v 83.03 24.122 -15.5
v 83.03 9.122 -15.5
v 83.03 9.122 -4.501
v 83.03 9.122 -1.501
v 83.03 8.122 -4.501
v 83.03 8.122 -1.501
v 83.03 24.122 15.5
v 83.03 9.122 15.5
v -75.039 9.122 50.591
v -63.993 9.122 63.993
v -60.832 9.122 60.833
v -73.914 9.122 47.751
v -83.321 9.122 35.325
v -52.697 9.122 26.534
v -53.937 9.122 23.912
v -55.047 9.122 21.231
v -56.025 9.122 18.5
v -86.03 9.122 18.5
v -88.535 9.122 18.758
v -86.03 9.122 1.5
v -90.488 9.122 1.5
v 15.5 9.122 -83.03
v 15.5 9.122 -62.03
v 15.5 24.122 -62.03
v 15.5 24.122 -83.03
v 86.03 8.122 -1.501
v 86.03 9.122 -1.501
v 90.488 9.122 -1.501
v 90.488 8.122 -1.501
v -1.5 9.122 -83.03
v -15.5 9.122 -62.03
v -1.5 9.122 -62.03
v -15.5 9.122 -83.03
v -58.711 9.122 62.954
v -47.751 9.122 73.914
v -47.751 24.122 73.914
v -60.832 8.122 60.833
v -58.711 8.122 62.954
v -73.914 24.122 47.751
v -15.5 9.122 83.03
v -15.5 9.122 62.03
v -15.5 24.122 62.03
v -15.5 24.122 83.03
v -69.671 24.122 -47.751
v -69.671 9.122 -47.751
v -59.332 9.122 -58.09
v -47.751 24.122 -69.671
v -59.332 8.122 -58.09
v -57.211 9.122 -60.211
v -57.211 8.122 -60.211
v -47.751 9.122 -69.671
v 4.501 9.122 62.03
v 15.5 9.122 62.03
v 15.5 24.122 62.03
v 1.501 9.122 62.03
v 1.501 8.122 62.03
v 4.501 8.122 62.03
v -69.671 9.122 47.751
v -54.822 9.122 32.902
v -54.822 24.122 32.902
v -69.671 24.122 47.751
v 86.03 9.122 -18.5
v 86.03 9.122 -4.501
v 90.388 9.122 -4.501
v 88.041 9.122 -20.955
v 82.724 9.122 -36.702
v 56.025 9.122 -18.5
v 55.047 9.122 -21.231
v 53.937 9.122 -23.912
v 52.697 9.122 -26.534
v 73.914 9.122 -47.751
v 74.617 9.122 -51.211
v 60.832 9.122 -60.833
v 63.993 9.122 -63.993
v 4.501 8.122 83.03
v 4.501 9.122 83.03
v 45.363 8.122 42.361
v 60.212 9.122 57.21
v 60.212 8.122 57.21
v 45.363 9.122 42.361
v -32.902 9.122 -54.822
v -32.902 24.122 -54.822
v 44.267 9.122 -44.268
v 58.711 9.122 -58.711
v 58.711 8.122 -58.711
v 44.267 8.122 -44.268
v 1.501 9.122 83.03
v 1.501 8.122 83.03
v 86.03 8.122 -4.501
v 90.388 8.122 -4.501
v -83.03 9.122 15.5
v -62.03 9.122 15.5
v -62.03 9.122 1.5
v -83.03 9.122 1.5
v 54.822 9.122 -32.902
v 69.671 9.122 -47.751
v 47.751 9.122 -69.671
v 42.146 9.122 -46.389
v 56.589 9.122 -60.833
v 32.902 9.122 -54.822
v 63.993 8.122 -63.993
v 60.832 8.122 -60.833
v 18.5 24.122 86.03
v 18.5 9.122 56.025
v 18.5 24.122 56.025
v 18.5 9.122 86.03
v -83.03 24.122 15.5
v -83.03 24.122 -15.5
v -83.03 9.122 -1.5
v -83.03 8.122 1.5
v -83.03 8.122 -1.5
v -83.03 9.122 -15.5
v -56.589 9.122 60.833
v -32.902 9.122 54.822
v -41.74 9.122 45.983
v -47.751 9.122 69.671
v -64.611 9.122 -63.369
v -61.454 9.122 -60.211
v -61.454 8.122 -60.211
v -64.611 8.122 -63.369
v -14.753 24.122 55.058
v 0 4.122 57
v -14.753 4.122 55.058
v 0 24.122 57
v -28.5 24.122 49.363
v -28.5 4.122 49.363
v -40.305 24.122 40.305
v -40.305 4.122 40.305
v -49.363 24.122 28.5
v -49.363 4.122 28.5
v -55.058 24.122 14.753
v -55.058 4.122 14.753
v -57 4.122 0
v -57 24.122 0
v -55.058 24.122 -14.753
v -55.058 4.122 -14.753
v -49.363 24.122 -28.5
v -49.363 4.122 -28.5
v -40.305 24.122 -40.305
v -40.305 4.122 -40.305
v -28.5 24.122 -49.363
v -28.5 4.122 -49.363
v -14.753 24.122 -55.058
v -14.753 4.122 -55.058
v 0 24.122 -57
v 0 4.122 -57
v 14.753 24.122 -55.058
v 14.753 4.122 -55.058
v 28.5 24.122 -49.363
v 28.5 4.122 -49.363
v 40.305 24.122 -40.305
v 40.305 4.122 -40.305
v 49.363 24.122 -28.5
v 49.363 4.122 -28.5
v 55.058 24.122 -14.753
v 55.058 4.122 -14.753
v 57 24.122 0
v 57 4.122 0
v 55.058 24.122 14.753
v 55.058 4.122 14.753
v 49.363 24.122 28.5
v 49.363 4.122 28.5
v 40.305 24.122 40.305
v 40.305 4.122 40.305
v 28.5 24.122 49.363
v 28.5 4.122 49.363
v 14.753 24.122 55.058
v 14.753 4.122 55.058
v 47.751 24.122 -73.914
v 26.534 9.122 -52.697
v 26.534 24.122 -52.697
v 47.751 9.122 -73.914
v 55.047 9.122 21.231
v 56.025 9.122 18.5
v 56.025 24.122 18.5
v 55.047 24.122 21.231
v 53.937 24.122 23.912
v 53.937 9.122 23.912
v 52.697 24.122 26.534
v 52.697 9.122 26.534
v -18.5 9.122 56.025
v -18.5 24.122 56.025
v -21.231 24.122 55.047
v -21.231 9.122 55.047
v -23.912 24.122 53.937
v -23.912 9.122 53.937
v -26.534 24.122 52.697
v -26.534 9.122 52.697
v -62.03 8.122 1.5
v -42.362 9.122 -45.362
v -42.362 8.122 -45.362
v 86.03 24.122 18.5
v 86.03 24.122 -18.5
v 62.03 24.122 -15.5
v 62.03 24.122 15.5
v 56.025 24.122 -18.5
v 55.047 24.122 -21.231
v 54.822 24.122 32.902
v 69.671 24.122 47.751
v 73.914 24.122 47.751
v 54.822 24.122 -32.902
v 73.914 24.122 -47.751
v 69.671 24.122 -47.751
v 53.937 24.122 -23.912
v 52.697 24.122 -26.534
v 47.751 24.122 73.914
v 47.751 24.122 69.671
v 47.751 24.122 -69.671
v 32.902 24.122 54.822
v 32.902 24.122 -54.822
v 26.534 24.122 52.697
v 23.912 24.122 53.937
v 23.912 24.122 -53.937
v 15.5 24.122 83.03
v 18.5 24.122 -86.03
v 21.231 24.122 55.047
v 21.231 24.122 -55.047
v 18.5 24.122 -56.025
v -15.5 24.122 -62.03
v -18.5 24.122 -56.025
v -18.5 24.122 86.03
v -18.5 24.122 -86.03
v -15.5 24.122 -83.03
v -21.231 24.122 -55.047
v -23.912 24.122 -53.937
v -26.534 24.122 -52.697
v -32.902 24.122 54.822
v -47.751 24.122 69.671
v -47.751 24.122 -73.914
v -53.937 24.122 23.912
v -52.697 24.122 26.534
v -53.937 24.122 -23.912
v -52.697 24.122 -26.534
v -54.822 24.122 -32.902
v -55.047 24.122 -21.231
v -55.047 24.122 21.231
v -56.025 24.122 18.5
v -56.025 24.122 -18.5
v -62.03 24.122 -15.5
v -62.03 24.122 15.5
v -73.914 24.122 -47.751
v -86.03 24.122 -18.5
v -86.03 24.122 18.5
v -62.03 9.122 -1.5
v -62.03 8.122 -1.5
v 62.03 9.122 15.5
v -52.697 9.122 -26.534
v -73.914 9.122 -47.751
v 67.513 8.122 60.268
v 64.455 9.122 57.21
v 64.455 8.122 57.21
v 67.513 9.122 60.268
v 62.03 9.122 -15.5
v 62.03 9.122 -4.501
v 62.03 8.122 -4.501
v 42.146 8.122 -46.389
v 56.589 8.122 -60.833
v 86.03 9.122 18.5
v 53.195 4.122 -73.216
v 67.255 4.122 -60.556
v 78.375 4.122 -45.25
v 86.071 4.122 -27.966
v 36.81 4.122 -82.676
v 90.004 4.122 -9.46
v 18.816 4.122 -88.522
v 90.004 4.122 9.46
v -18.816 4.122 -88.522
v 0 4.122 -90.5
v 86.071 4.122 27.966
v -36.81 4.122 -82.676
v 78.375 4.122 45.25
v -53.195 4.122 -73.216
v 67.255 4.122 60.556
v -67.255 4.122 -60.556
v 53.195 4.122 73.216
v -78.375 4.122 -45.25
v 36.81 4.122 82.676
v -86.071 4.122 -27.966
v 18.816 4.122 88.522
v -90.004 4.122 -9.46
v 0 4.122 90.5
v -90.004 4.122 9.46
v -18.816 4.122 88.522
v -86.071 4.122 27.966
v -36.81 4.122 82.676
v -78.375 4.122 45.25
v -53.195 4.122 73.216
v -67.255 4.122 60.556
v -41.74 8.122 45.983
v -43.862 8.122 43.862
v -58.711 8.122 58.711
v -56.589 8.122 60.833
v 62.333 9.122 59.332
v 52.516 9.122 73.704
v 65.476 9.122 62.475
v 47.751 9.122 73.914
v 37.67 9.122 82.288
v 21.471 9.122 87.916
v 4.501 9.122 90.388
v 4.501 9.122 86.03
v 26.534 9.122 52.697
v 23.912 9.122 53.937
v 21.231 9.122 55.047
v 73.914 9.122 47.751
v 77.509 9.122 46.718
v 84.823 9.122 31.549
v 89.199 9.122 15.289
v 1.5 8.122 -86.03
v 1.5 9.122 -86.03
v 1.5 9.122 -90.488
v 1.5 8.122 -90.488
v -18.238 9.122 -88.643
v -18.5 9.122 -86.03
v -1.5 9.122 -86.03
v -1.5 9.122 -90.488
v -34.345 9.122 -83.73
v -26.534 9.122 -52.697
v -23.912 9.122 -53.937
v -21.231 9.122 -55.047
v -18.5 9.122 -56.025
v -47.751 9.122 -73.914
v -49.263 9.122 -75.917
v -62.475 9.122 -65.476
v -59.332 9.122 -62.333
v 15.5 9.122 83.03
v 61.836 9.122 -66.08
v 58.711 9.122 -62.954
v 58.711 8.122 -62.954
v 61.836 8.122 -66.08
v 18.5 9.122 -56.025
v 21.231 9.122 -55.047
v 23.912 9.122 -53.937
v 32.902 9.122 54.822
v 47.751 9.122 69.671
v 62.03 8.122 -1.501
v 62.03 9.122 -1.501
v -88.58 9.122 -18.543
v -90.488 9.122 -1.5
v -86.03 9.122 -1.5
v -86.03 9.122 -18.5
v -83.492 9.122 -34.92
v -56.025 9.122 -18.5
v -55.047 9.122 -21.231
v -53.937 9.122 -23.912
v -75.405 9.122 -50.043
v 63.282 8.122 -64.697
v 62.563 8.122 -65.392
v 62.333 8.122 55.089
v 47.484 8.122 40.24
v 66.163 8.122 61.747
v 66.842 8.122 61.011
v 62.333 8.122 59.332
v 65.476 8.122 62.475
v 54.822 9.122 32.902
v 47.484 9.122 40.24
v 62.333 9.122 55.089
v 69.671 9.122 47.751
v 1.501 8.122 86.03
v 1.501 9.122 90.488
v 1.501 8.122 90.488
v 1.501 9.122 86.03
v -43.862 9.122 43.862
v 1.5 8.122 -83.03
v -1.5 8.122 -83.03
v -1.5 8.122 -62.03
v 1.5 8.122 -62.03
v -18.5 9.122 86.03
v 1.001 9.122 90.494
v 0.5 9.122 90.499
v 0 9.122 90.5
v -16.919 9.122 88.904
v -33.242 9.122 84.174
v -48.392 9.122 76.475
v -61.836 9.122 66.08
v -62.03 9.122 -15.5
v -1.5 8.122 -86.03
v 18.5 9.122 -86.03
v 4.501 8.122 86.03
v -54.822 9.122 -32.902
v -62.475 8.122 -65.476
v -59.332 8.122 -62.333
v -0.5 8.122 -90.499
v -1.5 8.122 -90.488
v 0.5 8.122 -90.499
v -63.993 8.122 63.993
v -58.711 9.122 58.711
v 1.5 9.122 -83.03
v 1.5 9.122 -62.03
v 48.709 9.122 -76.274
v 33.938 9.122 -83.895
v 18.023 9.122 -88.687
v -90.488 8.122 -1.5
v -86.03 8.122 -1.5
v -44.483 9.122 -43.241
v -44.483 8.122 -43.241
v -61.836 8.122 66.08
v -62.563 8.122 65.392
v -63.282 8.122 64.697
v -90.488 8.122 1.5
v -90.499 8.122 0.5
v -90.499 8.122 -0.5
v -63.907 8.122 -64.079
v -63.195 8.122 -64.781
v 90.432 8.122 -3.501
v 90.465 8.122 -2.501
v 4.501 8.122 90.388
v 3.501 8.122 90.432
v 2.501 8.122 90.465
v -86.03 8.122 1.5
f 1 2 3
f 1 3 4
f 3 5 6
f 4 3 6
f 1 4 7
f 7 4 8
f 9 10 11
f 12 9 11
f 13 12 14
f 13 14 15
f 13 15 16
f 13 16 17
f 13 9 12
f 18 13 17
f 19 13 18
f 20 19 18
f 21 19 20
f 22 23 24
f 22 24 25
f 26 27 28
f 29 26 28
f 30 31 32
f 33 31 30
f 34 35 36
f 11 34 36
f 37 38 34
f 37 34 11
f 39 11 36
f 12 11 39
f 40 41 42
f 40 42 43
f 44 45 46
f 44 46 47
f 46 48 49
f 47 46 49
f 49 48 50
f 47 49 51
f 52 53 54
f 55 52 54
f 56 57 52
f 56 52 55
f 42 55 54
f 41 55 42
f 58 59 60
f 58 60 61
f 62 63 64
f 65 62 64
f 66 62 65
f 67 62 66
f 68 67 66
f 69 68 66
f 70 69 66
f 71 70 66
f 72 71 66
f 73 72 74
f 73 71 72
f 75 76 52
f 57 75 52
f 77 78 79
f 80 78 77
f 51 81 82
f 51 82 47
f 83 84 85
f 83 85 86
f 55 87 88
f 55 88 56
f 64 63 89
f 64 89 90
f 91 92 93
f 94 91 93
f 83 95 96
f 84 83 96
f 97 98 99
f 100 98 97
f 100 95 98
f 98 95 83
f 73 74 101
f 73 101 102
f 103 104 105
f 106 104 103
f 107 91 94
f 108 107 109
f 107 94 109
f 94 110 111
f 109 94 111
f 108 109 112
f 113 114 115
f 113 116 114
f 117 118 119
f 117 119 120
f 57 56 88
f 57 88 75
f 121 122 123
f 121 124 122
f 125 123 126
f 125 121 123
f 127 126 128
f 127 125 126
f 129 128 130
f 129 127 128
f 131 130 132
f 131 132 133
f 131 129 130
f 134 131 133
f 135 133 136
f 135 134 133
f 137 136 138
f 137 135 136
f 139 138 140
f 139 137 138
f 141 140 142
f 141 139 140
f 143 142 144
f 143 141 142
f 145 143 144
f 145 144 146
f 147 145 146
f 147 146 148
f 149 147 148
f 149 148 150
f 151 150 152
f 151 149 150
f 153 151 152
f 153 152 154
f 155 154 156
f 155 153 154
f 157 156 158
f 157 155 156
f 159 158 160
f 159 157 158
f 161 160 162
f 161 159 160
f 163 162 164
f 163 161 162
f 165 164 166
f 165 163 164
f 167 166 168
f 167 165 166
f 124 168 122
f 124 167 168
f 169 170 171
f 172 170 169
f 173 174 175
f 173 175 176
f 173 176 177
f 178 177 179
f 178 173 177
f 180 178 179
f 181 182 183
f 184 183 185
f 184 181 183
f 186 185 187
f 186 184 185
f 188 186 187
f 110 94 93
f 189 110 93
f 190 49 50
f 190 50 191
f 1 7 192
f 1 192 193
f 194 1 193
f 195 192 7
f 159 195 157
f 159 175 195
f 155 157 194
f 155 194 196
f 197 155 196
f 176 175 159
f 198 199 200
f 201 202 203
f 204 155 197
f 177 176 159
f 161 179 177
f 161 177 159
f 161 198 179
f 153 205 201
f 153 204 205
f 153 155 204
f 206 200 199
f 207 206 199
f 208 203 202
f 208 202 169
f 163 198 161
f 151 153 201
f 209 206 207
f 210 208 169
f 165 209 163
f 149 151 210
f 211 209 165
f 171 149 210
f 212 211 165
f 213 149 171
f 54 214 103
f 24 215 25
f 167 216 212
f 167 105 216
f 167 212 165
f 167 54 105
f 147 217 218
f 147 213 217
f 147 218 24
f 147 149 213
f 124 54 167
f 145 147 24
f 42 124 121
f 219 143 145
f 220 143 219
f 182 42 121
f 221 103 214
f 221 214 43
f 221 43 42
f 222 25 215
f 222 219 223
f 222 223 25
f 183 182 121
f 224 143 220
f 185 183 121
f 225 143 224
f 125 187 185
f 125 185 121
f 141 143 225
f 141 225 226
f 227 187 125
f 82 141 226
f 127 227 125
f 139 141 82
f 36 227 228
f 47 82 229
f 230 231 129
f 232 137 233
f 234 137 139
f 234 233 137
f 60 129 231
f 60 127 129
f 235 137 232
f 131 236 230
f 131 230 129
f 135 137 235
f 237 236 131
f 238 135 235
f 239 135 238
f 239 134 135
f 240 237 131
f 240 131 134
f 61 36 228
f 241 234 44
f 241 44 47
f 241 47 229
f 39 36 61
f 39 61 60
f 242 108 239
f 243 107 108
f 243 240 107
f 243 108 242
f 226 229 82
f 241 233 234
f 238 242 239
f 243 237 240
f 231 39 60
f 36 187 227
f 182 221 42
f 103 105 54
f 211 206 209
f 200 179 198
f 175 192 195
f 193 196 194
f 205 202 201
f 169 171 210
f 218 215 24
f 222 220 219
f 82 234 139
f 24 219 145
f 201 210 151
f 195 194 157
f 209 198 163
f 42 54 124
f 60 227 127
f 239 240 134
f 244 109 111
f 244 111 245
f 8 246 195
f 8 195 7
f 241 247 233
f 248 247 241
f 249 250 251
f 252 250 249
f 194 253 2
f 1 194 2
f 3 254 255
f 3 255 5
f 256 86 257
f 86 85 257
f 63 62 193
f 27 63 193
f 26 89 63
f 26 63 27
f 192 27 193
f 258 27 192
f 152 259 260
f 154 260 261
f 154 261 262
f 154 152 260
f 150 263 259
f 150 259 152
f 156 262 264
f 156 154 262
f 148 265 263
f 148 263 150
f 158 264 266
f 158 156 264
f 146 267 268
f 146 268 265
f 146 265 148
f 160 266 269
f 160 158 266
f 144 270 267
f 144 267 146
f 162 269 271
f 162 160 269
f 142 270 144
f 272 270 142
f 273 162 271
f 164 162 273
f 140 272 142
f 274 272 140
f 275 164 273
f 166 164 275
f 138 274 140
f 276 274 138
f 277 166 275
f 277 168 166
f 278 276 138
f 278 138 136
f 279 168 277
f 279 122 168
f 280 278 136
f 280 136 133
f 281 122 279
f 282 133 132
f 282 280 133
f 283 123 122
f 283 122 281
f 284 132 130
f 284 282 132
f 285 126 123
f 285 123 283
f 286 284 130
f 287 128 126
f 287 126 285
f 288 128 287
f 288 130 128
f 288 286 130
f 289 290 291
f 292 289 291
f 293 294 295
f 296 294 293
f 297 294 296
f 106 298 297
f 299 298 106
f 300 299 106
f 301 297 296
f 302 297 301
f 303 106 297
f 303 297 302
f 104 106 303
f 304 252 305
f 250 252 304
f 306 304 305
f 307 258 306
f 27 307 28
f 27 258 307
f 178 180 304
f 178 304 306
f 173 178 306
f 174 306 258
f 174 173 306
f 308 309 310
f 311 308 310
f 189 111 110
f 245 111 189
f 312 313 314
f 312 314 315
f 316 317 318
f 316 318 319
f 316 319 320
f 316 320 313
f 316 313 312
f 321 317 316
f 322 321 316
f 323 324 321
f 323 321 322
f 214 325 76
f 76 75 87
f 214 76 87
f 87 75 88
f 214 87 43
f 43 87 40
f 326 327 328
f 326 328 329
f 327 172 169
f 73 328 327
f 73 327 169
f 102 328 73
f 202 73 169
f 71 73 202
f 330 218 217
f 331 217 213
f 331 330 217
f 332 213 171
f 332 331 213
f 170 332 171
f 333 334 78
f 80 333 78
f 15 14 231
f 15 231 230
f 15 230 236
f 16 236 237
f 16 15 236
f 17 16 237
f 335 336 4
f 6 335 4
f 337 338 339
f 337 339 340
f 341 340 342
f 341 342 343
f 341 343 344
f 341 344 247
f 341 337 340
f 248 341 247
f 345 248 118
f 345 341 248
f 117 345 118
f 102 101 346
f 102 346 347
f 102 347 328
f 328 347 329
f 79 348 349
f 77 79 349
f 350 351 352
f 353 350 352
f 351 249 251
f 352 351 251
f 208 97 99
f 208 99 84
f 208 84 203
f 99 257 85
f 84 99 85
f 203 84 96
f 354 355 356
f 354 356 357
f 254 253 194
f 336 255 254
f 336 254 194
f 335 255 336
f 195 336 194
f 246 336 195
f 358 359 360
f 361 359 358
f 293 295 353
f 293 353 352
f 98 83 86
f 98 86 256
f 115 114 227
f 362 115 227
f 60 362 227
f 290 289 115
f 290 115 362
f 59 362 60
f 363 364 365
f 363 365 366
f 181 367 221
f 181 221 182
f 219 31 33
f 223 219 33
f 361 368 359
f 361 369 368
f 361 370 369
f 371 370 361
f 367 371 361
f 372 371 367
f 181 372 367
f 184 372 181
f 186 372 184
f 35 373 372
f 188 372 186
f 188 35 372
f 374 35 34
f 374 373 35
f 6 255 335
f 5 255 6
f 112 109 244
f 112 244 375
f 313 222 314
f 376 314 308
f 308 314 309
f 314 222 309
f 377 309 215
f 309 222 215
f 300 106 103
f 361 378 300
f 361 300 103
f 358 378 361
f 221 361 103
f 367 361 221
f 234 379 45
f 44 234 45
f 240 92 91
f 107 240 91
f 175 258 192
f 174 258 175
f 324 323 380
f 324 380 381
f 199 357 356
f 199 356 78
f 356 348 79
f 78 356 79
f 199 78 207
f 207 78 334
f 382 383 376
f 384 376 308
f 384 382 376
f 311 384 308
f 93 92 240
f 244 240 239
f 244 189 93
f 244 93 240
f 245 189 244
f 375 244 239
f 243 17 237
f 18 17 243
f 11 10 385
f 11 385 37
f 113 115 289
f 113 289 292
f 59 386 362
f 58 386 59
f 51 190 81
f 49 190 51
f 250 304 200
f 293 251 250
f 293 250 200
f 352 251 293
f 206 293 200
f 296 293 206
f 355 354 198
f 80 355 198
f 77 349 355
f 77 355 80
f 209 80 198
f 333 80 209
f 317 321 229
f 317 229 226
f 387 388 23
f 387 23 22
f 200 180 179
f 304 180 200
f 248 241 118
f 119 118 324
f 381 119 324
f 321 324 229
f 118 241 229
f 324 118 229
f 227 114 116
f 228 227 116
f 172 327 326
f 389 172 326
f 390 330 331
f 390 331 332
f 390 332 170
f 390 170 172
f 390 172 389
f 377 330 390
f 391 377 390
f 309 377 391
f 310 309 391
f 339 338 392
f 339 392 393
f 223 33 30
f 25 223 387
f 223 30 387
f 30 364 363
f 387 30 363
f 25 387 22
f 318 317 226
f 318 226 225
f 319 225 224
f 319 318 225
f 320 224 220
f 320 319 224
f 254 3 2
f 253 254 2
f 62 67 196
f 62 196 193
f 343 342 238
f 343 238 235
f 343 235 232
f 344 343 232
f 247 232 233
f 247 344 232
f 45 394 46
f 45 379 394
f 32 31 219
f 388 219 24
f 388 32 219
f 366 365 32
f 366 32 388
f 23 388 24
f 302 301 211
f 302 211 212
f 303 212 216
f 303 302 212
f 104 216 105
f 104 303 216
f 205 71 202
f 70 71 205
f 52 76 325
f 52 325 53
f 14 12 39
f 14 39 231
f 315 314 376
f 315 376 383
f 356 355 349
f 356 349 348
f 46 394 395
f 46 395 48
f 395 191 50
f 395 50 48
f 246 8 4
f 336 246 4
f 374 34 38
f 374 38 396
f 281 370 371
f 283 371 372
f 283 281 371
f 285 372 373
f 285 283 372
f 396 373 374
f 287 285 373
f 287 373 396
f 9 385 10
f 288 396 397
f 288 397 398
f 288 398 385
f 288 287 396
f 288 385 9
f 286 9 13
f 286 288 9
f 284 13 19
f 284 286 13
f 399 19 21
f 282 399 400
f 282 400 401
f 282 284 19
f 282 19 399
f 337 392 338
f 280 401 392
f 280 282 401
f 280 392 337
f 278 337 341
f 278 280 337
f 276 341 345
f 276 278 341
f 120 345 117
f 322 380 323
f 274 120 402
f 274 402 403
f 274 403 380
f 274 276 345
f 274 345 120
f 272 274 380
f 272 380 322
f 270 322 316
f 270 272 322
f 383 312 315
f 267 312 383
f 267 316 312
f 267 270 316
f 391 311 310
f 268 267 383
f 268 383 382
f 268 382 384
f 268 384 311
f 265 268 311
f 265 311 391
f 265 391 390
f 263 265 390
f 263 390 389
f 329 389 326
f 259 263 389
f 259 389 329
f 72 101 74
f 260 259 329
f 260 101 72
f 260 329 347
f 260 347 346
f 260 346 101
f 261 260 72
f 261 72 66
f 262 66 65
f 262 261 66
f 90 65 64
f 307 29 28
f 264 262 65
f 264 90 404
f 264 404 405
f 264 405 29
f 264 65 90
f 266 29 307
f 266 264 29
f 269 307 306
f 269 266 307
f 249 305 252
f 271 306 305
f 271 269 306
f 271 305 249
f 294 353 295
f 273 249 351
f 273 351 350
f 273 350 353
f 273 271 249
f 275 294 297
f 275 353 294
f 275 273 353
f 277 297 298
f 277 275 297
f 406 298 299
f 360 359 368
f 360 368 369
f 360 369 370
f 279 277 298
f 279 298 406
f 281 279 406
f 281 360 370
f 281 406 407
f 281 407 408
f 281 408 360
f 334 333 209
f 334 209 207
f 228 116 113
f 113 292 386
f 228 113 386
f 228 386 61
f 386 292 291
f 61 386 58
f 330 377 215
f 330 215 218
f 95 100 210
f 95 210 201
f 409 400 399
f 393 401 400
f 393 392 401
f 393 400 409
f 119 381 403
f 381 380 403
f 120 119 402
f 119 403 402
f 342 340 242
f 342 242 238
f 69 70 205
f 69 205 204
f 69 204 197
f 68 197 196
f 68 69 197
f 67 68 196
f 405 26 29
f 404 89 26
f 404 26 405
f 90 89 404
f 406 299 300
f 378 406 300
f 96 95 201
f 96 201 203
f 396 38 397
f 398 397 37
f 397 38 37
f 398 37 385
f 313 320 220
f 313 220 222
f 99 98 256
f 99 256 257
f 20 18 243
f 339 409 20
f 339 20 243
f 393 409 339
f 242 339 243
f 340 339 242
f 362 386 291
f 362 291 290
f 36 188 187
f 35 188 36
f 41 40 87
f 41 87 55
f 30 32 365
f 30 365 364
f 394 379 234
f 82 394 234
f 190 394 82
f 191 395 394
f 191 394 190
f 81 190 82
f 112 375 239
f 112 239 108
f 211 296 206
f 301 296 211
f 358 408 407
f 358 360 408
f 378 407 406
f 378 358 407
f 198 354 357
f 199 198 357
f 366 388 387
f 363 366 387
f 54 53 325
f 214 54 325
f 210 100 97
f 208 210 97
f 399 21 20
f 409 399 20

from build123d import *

# Parameters (mm, degrees)
SKETCH3_W                       = 56
SKETCH3_H                       = 3
SKETCH3_W_2                     = 3
SKETCH3_H_2                     = 56
CUT_EXTRUDE1_DEPTH              = 1
BOSS_EXTRUDE1_REACH             = 130.862
SKETCH4_W                       = 31
SKETCH4_H                       = 21
BOSS_EXTRUDE1_DIRECTION_2_REACH = 130.862
CIRPATTERN1_COUNT               = 8


with BuildPart() as part:
    # Sketch2 → Revolve1 (revolve)
    with BuildSketch(Plane(origin=(0, 0, 0), x_dir=(0, 0, -1), z_dir=(1, 0, 0))):
        Polygon((-90.5, 4.121863799), (-57, 4.121863799), (-57, 6.121863799), (-57, 24.121863799), (-59, 24.121863799), (-59, 9.121863799), (-90.5, 9.121863799), align=None)
    revolve(axis=Axis((0, 80.23297491, 0), (0, -1, 0)))

    # Sketch3 → Cut-Extrude1 (cut)
    with BuildSketch(Plane(origin=(0, 9.121863799, 0), x_dir=(1, 0, 0), z_dir=(0, 1, 0))):
        with Locations((-86.980929121, 0)):
            Rectangle(SKETCH3_W, SKETCH3_H)
        Polygon((-82.985966376, 81.743596048), (-80.864646033, 83.864916391), (-41.266666286, 44.266936645), (-43.38798663, 42.145616301), align=None)
        with Locations((0, 89.981852183)):
            Rectangle(SKETCH3_W_2, SKETCH3_H_2)
        Polygon((81.743596048, 85.986889438), (83.864916391, 83.865569094), (44.266936645, 44.267589348), (42.145616301, 46.388909691), align=None)
        with Locations((89.981852183, 3.000923062)):
            Rectangle(SKETCH3_W, SKETCH3_H)
        Polygon((85.986889438, -78.742672986), (83.865569094, -80.86399333), (44.267589348, -41.266013583), (46.388909691, -39.14469324), align=None)
        with Locations((3.000923062, -86.980929121)):
            Rectangle(SKETCH3_W_2, SKETCH3_H_2)
        Polygon((-78.742672986, -82.985966376), (-80.86399333, -80.864646033), (-41.266013583, -41.266666286), (-39.14469324, -43.38798663), align=None)
    extrude(amount=-CUT_EXTRUDE1_DEPTH, mode=Mode.SUBTRACT)

    # Boss-Extrude1: up to this face of the body (flat: up to its plane)
    boss_extrude1_end = Plane(part.part.faces().sort_by_distance((0, 24.121863799, -58.668772004))[0])
    # Sketch4 → Boss-Extrude1 (add, up to the picked face)
    with BuildSketch(Plane(origin=(0, 9.121863799, 0), x_dir=(1, 0, 0), z_dir=(0, 1, 0)), mode=Mode.PRIVATE) as boss_extrude1_sk1:
        with BuildLine():
            Line((18.5, 86.03), (18.5, 59.03))
            Line((18.5, 59.03), (18.5, 55.707696119))
            ThreePointArc((18.5, 55.707696119), (0, 58.209424556), (-18.5, 55.707696119))
            Line((-18.5, 55.707696119), (-18.5, 59.03))
            Line((-18.5, 59.03), (-18.5, 86.03))
            Line((-18.5, 86.03), (18.5, 86.03))
        make_face()
        with Locations((0, 72.53)):
            Rectangle(SKETCH4_W, SKETCH4_H, mode=Mode.SUBTRACT)
    boss_extrude1_tool1 = split(extrude(boss_extrude1_sk1.sketch, amount=BOSS_EXTRUDE1_REACH, mode=Mode.PRIVATE), bisect_by=boss_extrude1_end, keep=Keep.BOTH, mode=Mode.PRIVATE)
    boss_extrude1 = boss_extrude1_tool1.solids().sort_by(Axis((18.021623, 9.121864, -72.53), (0, 1, 0)))[0]
    add(boss_extrude1)

    # Boss-Extrude1 direction 2: up to this face of the body (flat: up to its plane)
    boss_extrude1_direction_2_end = Plane(part.part.faces().sort_by_distance((-52.938409817, 8.121863799, -53.817117102))[0])
    # Sketch4 → Boss-Extrude1 direction 2 (add, up to the picked face)
    with BuildSketch(Plane(origin=(0, 9.121863799, 0), x_dir=(1, 0, 0), z_dir=(0, 1, 0)), mode=Mode.PRIVATE) as boss_extrude1_direction_2_sk1:
        with BuildLine():
            Line((18.5, 86.03), (18.5, 59.03))
            Line((18.5, 59.03), (18.5, 55.707696119))
            ThreePointArc((18.5, 55.707696119), (0, 58.209424556), (-18.5, 55.707696119))
            Line((-18.5, 55.707696119), (-18.5, 59.03))
            Line((-18.5, 59.03), (-18.5, 86.03))
            Line((-18.5, 86.03), (18.5, 86.03))
        make_face()
        with Locations((0, 72.53)):
            Rectangle(SKETCH4_W, SKETCH4_H, mode=Mode.SUBTRACT)
    boss_extrude1_direction_2_tool1 = split(extrude(boss_extrude1_direction_2_sk1.sketch, amount=-BOSS_EXTRUDE1_DIRECTION_2_REACH, mode=Mode.PRIVATE), bisect_by=boss_extrude1_direction_2_end, keep=Keep.BOTH, mode=Mode.PRIVATE)
    boss_extrude1_direction_2 = boss_extrude1_direction_2_tool1.solids().sort_by(Axis((18.021623, 9.121864, -72.53), (0, -1, 0)))[0]
    add(boss_extrude1_direction_2)

    # CirPattern1: Boss-Extrude1, Boss-Extrude1 direction 2 ×8 about axis
    cirpattern1_axis = Axis((0, 0, 0), (0, 1, 0))
    add([boss_extrude1.rotate(cirpattern1_axis, i * 360 / CIRPATTERN1_COUNT) for i in range(1, CIRPATTERN1_COUNT)])
    add([boss_extrude1_direction_2.rotate(cirpattern1_axis, i * 360 / CIRPATTERN1_COUNT) for i in range(1, CIRPATTERN1_COUNT)])


solid = part.part
